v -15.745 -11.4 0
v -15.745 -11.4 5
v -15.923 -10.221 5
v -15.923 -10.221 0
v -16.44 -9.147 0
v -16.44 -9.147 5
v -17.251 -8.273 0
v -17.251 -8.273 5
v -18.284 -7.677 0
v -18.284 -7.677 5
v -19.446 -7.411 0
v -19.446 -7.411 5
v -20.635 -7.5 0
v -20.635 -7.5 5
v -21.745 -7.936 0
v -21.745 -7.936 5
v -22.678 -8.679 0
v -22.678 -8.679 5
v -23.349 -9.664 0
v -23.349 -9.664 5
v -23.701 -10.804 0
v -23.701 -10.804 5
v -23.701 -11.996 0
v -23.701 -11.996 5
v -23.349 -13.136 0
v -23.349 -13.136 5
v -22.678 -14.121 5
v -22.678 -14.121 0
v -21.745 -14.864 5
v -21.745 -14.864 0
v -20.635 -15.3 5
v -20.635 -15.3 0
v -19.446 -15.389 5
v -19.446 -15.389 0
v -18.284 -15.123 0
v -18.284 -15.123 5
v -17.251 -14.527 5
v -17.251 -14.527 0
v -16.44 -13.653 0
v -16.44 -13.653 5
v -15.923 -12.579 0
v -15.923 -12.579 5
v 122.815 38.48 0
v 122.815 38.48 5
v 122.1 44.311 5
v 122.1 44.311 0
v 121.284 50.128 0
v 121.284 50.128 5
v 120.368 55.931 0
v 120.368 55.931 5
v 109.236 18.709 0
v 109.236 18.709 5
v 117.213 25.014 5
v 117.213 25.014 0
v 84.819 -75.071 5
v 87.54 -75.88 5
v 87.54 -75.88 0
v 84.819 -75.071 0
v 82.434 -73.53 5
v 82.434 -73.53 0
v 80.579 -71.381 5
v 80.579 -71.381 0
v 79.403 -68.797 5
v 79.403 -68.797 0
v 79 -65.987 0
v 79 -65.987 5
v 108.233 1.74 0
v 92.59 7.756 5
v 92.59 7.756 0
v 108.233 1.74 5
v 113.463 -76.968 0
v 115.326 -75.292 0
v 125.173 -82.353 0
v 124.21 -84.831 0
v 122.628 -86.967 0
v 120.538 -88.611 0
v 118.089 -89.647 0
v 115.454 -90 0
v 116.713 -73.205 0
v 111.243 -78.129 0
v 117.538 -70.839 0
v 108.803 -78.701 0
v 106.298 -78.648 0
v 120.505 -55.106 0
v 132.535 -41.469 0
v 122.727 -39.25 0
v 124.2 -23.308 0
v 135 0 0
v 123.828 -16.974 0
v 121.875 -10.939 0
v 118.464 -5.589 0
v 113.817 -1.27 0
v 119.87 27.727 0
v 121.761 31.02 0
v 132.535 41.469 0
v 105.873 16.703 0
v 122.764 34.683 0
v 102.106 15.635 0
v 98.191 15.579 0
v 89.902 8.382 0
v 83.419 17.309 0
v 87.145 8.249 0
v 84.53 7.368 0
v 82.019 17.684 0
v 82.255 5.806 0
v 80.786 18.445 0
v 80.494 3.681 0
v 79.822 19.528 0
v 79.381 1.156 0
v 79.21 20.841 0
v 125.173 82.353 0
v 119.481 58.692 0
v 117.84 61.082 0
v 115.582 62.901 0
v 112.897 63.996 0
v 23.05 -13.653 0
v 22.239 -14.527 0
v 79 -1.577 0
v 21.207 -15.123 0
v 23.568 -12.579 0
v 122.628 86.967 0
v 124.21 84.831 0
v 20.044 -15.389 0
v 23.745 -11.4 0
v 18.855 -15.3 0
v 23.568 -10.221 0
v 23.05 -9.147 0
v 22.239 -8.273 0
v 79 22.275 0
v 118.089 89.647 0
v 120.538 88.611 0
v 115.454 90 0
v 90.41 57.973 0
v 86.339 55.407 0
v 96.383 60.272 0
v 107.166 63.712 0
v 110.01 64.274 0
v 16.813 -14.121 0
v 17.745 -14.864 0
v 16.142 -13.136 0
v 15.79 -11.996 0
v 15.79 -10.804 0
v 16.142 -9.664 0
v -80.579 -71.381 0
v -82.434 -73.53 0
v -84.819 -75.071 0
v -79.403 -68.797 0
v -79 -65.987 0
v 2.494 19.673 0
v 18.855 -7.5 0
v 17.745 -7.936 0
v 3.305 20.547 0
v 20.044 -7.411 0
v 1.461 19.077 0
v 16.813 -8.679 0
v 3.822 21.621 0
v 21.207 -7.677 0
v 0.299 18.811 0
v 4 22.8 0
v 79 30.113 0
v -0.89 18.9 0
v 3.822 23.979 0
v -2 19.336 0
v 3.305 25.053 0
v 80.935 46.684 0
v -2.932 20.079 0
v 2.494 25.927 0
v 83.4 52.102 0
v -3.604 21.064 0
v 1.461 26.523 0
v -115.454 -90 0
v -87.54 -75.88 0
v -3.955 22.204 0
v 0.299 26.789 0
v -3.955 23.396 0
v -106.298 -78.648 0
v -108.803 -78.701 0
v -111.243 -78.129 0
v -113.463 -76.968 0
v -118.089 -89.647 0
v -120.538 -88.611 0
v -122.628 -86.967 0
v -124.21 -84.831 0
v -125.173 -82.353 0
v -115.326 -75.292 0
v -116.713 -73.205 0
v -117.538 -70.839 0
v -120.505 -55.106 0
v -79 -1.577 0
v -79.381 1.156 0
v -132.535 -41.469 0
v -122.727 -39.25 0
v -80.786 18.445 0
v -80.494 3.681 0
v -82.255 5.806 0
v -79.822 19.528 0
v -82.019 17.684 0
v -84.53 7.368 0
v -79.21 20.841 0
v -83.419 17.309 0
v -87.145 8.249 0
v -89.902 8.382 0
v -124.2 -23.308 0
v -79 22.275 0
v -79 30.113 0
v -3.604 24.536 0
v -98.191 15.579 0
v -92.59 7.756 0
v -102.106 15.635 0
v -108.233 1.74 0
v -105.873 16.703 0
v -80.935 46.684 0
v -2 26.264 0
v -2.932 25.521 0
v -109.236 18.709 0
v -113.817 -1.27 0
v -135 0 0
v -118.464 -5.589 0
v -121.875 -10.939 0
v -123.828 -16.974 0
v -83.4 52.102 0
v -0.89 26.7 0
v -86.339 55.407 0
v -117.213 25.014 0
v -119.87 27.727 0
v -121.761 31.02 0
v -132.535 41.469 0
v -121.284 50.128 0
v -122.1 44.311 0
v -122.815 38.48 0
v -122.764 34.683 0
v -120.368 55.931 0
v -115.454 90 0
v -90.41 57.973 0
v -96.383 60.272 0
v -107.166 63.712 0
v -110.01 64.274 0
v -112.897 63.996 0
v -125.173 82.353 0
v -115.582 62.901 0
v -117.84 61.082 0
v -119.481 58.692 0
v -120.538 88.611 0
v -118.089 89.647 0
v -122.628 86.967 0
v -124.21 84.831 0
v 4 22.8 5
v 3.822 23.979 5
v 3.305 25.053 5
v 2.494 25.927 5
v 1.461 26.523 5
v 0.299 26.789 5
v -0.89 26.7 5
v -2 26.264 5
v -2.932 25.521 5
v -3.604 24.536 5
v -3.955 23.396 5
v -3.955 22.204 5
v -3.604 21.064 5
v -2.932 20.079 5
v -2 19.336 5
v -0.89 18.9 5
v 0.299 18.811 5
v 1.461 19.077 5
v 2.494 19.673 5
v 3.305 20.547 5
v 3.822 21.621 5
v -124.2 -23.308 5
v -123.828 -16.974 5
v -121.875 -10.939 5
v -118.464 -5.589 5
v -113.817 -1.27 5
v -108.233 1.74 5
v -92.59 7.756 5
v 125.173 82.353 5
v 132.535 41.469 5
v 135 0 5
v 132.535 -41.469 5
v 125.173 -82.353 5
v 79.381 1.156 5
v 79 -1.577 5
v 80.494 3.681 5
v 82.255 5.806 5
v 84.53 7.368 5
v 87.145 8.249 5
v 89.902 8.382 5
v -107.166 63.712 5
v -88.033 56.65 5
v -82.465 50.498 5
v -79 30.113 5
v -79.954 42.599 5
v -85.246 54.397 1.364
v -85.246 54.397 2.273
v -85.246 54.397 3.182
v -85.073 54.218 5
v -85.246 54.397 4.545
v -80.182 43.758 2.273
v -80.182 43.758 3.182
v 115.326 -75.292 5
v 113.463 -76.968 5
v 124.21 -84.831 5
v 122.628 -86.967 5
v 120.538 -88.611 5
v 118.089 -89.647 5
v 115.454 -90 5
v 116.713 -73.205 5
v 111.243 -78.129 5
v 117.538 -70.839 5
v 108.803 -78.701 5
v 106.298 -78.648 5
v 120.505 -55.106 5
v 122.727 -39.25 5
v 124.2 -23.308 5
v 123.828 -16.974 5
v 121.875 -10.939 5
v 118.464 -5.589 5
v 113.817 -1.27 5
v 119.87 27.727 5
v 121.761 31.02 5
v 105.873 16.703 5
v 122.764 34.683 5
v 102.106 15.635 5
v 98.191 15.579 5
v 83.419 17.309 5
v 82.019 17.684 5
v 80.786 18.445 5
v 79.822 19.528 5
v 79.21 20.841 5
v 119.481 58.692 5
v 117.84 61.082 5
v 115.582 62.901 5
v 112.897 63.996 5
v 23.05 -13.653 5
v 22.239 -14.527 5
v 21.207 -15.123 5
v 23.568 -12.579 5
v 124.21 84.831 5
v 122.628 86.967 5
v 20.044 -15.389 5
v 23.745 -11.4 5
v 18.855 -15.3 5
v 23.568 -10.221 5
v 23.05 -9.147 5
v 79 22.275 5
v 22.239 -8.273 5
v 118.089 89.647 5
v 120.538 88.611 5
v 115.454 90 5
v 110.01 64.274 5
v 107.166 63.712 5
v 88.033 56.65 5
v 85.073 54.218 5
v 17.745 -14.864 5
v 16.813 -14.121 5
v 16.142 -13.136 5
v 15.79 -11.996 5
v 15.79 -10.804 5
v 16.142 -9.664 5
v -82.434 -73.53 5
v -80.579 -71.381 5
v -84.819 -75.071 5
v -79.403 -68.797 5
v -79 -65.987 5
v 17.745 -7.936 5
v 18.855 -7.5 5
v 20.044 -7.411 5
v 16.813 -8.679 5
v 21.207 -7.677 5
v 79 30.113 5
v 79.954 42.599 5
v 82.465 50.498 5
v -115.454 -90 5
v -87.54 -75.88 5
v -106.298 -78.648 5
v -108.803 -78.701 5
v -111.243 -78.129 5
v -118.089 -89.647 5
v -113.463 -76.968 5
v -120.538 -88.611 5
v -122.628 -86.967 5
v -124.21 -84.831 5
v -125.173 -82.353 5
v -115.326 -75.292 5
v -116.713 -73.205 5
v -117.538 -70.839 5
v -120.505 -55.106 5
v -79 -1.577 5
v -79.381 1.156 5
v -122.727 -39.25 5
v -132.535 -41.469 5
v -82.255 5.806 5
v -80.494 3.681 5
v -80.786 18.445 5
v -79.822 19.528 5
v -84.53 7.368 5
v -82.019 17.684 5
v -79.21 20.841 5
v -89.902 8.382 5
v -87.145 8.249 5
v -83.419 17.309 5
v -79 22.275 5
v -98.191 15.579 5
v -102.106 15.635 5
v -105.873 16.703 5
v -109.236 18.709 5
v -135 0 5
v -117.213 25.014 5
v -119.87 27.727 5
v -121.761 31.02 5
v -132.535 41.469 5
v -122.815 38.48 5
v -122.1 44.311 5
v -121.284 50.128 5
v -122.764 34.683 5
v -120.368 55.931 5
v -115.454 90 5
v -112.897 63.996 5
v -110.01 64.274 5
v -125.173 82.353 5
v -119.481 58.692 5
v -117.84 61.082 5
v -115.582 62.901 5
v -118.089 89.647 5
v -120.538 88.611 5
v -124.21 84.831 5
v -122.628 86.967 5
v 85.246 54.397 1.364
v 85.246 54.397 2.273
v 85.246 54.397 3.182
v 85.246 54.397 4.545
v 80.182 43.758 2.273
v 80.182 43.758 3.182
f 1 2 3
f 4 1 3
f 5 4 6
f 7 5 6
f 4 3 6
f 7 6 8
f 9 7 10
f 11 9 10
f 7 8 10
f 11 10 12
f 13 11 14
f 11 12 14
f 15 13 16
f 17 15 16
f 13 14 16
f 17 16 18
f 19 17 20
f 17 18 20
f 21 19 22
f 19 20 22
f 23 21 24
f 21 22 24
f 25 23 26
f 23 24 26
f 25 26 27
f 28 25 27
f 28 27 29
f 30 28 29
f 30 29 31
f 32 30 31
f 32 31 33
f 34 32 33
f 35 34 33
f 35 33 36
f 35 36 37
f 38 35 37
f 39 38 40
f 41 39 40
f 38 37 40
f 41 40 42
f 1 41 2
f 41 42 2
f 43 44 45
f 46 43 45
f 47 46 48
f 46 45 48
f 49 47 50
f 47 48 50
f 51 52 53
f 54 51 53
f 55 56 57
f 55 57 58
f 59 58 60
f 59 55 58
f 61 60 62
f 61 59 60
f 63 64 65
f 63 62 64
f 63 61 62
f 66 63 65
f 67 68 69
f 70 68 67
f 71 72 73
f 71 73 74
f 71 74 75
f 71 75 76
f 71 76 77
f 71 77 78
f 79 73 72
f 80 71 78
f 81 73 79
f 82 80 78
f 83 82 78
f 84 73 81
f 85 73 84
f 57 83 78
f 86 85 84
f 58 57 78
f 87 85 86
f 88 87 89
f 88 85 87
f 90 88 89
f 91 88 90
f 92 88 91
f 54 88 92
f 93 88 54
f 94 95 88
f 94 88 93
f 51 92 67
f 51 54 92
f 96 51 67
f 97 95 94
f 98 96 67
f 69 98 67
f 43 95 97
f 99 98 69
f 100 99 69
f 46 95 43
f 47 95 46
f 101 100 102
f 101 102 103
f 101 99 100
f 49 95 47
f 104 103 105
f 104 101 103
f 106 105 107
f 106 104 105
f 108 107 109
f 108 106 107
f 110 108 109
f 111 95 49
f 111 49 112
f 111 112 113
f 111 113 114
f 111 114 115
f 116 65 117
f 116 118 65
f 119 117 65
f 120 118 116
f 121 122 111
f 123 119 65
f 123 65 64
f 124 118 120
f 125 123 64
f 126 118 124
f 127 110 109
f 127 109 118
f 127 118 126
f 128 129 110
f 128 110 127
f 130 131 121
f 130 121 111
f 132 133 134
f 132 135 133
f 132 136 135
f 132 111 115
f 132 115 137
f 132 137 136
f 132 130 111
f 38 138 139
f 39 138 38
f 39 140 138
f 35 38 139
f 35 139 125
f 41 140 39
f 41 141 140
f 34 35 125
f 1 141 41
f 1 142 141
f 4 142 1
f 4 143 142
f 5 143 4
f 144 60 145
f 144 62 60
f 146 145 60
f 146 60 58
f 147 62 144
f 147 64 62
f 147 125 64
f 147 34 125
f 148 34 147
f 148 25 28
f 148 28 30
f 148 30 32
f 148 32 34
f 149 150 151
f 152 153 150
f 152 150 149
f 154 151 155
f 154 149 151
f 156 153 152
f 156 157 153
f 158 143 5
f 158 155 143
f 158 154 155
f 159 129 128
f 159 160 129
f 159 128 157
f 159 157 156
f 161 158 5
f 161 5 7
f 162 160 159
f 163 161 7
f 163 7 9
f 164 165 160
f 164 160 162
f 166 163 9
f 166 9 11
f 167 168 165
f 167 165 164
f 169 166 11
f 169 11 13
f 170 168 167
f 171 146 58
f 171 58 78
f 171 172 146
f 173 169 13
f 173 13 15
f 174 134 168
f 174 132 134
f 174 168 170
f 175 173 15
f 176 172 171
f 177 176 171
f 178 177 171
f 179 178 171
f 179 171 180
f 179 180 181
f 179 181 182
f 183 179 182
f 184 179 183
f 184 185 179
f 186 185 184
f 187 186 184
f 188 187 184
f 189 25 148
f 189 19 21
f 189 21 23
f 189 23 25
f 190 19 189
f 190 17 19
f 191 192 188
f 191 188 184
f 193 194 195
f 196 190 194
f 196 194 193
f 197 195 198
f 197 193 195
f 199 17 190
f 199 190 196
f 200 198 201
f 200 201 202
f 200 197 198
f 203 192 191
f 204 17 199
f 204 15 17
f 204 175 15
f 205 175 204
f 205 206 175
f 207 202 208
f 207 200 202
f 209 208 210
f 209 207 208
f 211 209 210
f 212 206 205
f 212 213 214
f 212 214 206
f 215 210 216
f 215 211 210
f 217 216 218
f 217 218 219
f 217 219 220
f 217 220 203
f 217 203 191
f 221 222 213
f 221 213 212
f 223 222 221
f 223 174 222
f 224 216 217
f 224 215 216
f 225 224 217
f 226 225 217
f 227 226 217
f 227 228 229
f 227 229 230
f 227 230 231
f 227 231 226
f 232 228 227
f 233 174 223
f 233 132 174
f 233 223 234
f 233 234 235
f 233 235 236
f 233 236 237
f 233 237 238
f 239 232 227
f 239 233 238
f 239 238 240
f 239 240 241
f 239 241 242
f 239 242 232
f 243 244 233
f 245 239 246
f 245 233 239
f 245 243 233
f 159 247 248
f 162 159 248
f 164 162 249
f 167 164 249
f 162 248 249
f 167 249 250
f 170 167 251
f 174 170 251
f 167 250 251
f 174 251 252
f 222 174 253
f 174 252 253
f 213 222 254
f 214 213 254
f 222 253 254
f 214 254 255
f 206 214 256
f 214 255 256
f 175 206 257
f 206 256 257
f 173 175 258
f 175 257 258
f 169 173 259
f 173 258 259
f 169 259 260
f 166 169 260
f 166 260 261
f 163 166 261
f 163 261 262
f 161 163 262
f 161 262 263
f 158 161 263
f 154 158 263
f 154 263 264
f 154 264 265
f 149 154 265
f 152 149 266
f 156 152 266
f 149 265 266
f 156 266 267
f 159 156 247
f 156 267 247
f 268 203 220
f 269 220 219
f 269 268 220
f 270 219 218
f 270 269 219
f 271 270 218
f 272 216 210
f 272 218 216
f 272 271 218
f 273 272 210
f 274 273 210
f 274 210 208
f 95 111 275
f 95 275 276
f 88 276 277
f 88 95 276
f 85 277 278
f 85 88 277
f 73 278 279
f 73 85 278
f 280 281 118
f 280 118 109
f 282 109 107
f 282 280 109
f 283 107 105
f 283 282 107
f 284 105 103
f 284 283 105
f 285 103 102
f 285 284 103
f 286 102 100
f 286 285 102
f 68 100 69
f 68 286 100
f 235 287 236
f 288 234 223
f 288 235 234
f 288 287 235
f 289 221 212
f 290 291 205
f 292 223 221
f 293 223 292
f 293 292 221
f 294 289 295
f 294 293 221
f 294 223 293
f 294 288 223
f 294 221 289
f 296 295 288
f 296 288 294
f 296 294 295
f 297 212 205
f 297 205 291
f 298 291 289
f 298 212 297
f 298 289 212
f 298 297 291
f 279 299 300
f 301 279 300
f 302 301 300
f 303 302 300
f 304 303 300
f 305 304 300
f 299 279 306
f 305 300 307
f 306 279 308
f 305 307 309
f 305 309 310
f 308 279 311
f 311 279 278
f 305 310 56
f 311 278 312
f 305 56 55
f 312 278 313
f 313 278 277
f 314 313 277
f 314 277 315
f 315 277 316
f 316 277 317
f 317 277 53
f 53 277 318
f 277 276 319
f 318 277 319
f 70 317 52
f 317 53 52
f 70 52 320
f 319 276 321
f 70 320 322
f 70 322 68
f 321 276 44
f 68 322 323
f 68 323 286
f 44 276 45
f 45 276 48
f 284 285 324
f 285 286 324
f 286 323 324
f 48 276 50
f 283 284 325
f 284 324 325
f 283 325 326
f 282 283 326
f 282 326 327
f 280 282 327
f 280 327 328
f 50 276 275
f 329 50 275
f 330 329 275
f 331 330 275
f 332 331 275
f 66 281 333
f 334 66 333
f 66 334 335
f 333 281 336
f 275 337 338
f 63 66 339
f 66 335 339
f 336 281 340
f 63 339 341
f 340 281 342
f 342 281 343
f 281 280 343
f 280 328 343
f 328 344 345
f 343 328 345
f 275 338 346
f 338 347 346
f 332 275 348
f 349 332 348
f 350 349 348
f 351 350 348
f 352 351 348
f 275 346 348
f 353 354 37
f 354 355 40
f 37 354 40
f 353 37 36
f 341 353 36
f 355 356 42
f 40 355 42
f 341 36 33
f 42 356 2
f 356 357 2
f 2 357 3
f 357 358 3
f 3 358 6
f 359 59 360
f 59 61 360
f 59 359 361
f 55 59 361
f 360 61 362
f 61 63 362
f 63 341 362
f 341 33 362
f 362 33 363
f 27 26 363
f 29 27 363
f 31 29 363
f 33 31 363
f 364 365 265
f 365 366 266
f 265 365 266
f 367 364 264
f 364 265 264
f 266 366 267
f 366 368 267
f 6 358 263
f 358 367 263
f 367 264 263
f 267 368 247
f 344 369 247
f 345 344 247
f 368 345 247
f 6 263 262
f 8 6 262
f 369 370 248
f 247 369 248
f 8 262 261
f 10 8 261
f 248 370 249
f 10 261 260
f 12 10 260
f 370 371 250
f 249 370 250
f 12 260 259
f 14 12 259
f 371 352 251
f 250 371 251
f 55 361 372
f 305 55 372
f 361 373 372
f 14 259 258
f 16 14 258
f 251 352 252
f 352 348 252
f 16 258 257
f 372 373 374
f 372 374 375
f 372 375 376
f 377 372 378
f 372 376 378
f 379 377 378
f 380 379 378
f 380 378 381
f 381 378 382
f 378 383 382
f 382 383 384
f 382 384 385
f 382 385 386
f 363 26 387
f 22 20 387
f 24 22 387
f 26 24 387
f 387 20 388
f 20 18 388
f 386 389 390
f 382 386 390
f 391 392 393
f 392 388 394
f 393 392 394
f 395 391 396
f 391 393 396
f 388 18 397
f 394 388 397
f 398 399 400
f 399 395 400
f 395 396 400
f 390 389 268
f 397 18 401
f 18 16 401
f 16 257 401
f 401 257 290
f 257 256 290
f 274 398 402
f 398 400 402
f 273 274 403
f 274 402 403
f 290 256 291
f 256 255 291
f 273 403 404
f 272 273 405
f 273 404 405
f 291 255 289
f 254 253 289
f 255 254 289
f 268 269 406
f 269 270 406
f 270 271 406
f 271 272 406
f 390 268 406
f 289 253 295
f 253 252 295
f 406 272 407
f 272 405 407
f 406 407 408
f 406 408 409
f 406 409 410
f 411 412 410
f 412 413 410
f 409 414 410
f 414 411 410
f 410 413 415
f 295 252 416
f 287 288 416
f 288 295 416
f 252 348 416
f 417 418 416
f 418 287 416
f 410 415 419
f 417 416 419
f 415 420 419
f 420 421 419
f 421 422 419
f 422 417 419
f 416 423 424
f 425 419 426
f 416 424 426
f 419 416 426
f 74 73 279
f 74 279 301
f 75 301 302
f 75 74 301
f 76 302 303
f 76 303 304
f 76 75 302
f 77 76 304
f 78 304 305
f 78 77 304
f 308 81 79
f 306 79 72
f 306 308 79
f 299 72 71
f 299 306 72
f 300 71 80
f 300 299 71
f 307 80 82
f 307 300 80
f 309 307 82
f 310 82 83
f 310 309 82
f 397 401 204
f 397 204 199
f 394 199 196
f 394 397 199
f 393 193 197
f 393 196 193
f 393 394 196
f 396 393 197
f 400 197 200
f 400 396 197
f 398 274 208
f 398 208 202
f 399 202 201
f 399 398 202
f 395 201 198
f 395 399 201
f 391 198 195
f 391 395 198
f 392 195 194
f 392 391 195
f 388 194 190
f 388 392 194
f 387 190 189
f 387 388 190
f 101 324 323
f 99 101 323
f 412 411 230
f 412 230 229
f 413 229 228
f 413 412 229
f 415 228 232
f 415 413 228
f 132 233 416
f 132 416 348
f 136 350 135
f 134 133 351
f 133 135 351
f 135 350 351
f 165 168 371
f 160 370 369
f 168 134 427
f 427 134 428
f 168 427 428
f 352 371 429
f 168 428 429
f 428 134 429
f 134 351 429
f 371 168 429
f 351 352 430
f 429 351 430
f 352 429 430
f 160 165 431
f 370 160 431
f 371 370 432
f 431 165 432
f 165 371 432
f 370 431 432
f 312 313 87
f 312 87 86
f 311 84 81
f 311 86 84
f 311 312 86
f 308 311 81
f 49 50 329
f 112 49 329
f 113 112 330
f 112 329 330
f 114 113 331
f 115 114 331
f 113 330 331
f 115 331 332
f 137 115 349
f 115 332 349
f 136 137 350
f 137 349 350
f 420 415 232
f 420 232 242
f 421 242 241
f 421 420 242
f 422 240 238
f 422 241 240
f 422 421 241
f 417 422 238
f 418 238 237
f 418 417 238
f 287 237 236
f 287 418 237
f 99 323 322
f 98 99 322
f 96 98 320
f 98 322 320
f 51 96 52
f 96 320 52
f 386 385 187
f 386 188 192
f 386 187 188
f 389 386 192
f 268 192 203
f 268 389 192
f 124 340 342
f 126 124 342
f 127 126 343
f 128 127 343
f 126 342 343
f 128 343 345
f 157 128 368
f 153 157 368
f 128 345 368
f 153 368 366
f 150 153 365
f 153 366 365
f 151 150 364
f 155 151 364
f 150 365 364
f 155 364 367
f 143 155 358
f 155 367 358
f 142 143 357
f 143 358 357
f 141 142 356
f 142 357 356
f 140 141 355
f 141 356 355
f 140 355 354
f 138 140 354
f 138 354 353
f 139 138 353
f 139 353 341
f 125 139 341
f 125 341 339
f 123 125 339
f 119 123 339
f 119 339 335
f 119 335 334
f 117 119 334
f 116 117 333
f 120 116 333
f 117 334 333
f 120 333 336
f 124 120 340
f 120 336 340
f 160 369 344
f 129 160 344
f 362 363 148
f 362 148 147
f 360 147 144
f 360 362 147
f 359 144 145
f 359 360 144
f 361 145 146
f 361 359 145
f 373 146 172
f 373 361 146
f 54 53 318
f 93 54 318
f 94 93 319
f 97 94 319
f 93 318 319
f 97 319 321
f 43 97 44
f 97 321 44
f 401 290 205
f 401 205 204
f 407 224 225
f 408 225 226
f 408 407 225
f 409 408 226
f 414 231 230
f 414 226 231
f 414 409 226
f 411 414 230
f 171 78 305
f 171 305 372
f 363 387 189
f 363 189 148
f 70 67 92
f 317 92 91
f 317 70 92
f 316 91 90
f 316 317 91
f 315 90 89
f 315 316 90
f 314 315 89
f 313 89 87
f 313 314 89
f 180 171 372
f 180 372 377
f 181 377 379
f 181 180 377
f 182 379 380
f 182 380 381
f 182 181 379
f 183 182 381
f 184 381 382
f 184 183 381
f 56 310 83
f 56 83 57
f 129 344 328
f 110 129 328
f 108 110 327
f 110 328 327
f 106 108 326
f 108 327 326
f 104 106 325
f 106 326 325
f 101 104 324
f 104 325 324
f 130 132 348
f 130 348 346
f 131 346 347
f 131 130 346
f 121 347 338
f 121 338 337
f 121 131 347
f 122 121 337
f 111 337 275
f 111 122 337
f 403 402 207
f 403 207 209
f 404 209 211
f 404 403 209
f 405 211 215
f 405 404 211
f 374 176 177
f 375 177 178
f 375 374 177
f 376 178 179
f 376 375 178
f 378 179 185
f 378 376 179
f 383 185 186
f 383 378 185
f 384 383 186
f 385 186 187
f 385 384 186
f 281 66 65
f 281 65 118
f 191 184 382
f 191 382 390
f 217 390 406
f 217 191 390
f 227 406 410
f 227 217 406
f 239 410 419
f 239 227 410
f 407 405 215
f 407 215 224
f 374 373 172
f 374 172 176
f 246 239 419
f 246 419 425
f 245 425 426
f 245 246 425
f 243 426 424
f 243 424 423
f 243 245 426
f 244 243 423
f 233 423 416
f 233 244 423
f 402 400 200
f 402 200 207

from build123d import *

# Parameters (mm, degrees)
BOSS_EXTRUDE1_DEPTH = 5
SKETCH2_R           = 4
CUT_EXTRUDE1_DEPTH  = 5
CUT_EXTRUDE4_DEPTH  = 35


with BuildPart() as part:
    # Sketch1 → Boss-Extrude1 (new body)
    with BuildSketch(Plane.XY):
        with BuildLine():
            Line((115.454232837, -90), (-115.454232837, -90))
            ThreePointArc((-115.454232837, -90), (-121.637702261, -87.85905248), (-125.173474979, -82.352941176))
            ThreePointArc((-125.173474979, -82.352941176), (-135, 0), (-125.173474979, 82.352941176))
            ThreePointArc((-125.173474979, 82.352941176), (-121.637702261, 87.85905248), (-115.454232837, 90))
            Line((-115.454232837, 90), (115.454232837, 90))
            ThreePointArc((115.454232837, 90), (121.637702261, 87.85905248), (125.173474979, 82.352941176))
            ThreePointArc((125.173474979, 82.352941176), (135, 0), (125.173474979, -82.352941176))
            ThreePointArc((125.173474979, -82.352941176), (121.637702261, -87.85905248), (115.454232837, -90))
        make_face()
    extrude(amount=BOSS_EXTRUDE1_DEPTH)

    # Sketch2 → Cut-Extrude1 (cut)
    with BuildSketch(Plane.XY.offset(5)):
        with Locations((0, 22.8)):
            Circle(SKETCH2_R)
        with Locations((19.745379206, -11.4)):
            Circle(SKETCH2_R)
        with Locations((-19.745379206, -11.4)):
            Circle(SKETCH2_R)
    extrude(amount=-CUT_EXTRUDE1_DEPTH, mode=Mode.SUBTRACT)

    # Sketch4 → Cut-Extrude4 (cut)
    with BuildSketch(Plane.XY.offset(5)):
        with BuildLine():
            Line((92.589613382, 7.756373084), (108.233016215, 1.740021021))
            ThreePointArc((108.233016215, 1.740021021), (120.339926562, -8.155270139), (124.200171868, -23.307582551))
            ThreePointArc((124.200171868, -23.307582551), (121.709079907, -47.191053261), (117.538445446, -70.839129726))
            ThreePointArc((117.538445446, -70.839129726), (113.463443203, -76.968226609), (106.297665816, -78.648436814))
            Line((106.297665816, -78.648436814), (87.539762883, -75.879659935))
            ThreePointArc((87.539762883, -75.879659935), (81.430245342, -72.521282016), (79, -65.986849032))
            Line((79, -65.986849032), (79, -1.577151211))
            ThreePointArc((79, -1.577151211), (83.338557331, 6.665910532), (92.589613382, 7.756373084))
        make_face()
        with BuildLine():
            ThreePointArc((-92.589613382, 7.756373084), (-83.338557331, 6.665910532), (-79, -1.577151211))
            Line((-79, -1.577151211), (-79, -65.986849032))
            ThreePointArc((-79, -65.986849032), (-81.430245342, -72.521282016), (-87.539762883, -75.879659935))
            Line((-87.539762883, -75.879659935), (-106.297665816, -78.648436814))
            ThreePointArc((-106.297665816, -78.648436814), (-113.463443203, -76.968226609), (-117.538445446, -70.839129726))
            ThreePointArc((-117.538445446, -70.839129726), (-121.709079907, -47.191053261), (-124.200171868, -23.307582551))
            ThreePointArc((-124.200171868, -23.307582551), (-120.339926562, -8.155270139), (-108.233016215, 1.740021021))
            Line((-108.233016215, 1.740021021), (-92.589613382, 7.756373084))
        make_face()
        with BuildLine():
            add(Edge.make_bspline(
                [(-107.1656403, 63.712244747), (-105.421734613, 63.094579339), (-103.733740594, 62.553921113), (-100.607161167, 61.582975733), (-99.159247663, 61.147865372), (-96.410321129, 60.288497128), (-95.109448347, 59.864130878), (-92.675824035, 58.977926734), (-91.543513421, 58.51617249), (-89.457956468, 57.516788843), (-88.505180062, 56.979898005), (-86.763629608, 55.791229907), (-85.974064887, 55.140456421), (-84.517341855, 53.654449203), (-83.848519279, 52.818369685), (-82.607884183, 50.851859219), (-82.036322501, 49.719874222), (-81.010476423, 47.056406193), (-80.557249512, 45.52494381), (-79.807126347, 41.990071718), (-79.510581534, 39.987228491), (-79.107044911, 35.456158677), (-79, 32.928236614), (-79, 30.112884289)],
                knots=[0.308064858, 0.308064858, 0.308064858, 0.308064858, 0.375, 0.375, 0.4375, 0.4375, 0.5, 0.5, 0.5625, 0.5625, 0.625, 0.625, 0.6875, 0.6875, 0.75, 0.75, 0.8125, 0.8125, 0.875, 0.875, 0.9375, 0.9375, 1, 1, 1, 1], degree=3))
            Line((-79, 30.112884289), (-79, 22.274807415))
            ThreePointArc((-79, 22.274807415), (-80.264551221, 18.95119155), (-83.418568967, 17.308728685))
            Line((-83.418568967, 17.308728685), (-98.190518564, 15.579221284))
            ThreePointArc((-98.190518564, 15.579221284), (-104.024603132, 16.045769918), (-109.236054023, 18.709412158))
            Line((-109.236054023, 18.709412158), (-117.213085535, 25.01430829))
            ThreePointArc((-117.213085535, 25.01430829), (-121.761034531, 31.020418271), (-122.815466707, 38.480000696))
            ThreePointArc((-122.815466707, 38.480000696), (-121.704826963, 47.22138816), (-120.368031746, 55.931058302))
            ThreePointArc((-120.368031746, 55.931058302), (-115.58177318, 62.901067623), (-107.1656403, 63.712244747))
        make_face()
        with BuildLine():
            add(Edge.make_bspline(
                [(107.1656403, 63.712244747), (105.421734613, 63.094579339), (103.733740594, 62.553921113), (100.607161167, 61.582975733), (99.159247663, 61.147865372), (96.410321129, 60.288497128), (95.109448347, 59.864130878), (92.675824035, 58.977926734), (91.543513421, 58.51617249), (89.457956468, 57.516788843), (88.505180062, 56.979898005), (86.763629608, 55.791229907), (85.974064887, 55.140456421), (84.517341855, 53.654449203), (83.848519279, 52.818369685), (82.607884183, 50.851859219), (82.036322501, 49.719874222), (81.010476423, 47.056406193), (80.557249512, 45.52494381), (79.807126347, 41.990071718), (79.510581534, 39.987228491), (79.107044911, 35.456158677), (79, 32.928236614), (79, 30.112884289)],
                knots=[0.308064858, 0.308064858, 0.308064858, 0.308064858, 0.375, 0.375, 0.4375, 0.4375, 0.5, 0.5, 0.5625, 0.5625, 0.625, 0.625, 0.6875, 0.6875, 0.75, 0.75, 0.8125, 0.8125, 0.875, 0.875, 0.9375, 0.9375, 1, 1, 1, 1], degree=3))
            Line((79, 30.112884289), (79, 22.274807415))
            ThreePointArc((79, 22.274807415), (80.264551221, 18.95119155), (83.418568967, 17.308728685))
            Line((83.418568967, 17.308728685), (98.190518564, 15.579221284))
            ThreePointArc((98.190518564, 15.579221284), (104.024603132, 16.045769918), (109.236054023, 18.709412158))
            Line((109.236054023, 18.709412158), (117.213085535, 25.01430829))
            ThreePointArc((117.213085535, 25.01430829), (121.761034531, 31.020418271), (122.815466707, 38.480000696))
            ThreePointArc((122.815466707, 38.480000696), (121.704826963, 47.22138816), (120.368031746, 55.931058302))
            ThreePointArc((120.368031746, 55.931058302), (115.58177318, 62.901067623), (107.1656403, 63.712244747))
        make_face()
    extrude(amount=-CUT_EXTRUDE4_DEPTH, mode=Mode.SUBTRACT)


solid = part.part
